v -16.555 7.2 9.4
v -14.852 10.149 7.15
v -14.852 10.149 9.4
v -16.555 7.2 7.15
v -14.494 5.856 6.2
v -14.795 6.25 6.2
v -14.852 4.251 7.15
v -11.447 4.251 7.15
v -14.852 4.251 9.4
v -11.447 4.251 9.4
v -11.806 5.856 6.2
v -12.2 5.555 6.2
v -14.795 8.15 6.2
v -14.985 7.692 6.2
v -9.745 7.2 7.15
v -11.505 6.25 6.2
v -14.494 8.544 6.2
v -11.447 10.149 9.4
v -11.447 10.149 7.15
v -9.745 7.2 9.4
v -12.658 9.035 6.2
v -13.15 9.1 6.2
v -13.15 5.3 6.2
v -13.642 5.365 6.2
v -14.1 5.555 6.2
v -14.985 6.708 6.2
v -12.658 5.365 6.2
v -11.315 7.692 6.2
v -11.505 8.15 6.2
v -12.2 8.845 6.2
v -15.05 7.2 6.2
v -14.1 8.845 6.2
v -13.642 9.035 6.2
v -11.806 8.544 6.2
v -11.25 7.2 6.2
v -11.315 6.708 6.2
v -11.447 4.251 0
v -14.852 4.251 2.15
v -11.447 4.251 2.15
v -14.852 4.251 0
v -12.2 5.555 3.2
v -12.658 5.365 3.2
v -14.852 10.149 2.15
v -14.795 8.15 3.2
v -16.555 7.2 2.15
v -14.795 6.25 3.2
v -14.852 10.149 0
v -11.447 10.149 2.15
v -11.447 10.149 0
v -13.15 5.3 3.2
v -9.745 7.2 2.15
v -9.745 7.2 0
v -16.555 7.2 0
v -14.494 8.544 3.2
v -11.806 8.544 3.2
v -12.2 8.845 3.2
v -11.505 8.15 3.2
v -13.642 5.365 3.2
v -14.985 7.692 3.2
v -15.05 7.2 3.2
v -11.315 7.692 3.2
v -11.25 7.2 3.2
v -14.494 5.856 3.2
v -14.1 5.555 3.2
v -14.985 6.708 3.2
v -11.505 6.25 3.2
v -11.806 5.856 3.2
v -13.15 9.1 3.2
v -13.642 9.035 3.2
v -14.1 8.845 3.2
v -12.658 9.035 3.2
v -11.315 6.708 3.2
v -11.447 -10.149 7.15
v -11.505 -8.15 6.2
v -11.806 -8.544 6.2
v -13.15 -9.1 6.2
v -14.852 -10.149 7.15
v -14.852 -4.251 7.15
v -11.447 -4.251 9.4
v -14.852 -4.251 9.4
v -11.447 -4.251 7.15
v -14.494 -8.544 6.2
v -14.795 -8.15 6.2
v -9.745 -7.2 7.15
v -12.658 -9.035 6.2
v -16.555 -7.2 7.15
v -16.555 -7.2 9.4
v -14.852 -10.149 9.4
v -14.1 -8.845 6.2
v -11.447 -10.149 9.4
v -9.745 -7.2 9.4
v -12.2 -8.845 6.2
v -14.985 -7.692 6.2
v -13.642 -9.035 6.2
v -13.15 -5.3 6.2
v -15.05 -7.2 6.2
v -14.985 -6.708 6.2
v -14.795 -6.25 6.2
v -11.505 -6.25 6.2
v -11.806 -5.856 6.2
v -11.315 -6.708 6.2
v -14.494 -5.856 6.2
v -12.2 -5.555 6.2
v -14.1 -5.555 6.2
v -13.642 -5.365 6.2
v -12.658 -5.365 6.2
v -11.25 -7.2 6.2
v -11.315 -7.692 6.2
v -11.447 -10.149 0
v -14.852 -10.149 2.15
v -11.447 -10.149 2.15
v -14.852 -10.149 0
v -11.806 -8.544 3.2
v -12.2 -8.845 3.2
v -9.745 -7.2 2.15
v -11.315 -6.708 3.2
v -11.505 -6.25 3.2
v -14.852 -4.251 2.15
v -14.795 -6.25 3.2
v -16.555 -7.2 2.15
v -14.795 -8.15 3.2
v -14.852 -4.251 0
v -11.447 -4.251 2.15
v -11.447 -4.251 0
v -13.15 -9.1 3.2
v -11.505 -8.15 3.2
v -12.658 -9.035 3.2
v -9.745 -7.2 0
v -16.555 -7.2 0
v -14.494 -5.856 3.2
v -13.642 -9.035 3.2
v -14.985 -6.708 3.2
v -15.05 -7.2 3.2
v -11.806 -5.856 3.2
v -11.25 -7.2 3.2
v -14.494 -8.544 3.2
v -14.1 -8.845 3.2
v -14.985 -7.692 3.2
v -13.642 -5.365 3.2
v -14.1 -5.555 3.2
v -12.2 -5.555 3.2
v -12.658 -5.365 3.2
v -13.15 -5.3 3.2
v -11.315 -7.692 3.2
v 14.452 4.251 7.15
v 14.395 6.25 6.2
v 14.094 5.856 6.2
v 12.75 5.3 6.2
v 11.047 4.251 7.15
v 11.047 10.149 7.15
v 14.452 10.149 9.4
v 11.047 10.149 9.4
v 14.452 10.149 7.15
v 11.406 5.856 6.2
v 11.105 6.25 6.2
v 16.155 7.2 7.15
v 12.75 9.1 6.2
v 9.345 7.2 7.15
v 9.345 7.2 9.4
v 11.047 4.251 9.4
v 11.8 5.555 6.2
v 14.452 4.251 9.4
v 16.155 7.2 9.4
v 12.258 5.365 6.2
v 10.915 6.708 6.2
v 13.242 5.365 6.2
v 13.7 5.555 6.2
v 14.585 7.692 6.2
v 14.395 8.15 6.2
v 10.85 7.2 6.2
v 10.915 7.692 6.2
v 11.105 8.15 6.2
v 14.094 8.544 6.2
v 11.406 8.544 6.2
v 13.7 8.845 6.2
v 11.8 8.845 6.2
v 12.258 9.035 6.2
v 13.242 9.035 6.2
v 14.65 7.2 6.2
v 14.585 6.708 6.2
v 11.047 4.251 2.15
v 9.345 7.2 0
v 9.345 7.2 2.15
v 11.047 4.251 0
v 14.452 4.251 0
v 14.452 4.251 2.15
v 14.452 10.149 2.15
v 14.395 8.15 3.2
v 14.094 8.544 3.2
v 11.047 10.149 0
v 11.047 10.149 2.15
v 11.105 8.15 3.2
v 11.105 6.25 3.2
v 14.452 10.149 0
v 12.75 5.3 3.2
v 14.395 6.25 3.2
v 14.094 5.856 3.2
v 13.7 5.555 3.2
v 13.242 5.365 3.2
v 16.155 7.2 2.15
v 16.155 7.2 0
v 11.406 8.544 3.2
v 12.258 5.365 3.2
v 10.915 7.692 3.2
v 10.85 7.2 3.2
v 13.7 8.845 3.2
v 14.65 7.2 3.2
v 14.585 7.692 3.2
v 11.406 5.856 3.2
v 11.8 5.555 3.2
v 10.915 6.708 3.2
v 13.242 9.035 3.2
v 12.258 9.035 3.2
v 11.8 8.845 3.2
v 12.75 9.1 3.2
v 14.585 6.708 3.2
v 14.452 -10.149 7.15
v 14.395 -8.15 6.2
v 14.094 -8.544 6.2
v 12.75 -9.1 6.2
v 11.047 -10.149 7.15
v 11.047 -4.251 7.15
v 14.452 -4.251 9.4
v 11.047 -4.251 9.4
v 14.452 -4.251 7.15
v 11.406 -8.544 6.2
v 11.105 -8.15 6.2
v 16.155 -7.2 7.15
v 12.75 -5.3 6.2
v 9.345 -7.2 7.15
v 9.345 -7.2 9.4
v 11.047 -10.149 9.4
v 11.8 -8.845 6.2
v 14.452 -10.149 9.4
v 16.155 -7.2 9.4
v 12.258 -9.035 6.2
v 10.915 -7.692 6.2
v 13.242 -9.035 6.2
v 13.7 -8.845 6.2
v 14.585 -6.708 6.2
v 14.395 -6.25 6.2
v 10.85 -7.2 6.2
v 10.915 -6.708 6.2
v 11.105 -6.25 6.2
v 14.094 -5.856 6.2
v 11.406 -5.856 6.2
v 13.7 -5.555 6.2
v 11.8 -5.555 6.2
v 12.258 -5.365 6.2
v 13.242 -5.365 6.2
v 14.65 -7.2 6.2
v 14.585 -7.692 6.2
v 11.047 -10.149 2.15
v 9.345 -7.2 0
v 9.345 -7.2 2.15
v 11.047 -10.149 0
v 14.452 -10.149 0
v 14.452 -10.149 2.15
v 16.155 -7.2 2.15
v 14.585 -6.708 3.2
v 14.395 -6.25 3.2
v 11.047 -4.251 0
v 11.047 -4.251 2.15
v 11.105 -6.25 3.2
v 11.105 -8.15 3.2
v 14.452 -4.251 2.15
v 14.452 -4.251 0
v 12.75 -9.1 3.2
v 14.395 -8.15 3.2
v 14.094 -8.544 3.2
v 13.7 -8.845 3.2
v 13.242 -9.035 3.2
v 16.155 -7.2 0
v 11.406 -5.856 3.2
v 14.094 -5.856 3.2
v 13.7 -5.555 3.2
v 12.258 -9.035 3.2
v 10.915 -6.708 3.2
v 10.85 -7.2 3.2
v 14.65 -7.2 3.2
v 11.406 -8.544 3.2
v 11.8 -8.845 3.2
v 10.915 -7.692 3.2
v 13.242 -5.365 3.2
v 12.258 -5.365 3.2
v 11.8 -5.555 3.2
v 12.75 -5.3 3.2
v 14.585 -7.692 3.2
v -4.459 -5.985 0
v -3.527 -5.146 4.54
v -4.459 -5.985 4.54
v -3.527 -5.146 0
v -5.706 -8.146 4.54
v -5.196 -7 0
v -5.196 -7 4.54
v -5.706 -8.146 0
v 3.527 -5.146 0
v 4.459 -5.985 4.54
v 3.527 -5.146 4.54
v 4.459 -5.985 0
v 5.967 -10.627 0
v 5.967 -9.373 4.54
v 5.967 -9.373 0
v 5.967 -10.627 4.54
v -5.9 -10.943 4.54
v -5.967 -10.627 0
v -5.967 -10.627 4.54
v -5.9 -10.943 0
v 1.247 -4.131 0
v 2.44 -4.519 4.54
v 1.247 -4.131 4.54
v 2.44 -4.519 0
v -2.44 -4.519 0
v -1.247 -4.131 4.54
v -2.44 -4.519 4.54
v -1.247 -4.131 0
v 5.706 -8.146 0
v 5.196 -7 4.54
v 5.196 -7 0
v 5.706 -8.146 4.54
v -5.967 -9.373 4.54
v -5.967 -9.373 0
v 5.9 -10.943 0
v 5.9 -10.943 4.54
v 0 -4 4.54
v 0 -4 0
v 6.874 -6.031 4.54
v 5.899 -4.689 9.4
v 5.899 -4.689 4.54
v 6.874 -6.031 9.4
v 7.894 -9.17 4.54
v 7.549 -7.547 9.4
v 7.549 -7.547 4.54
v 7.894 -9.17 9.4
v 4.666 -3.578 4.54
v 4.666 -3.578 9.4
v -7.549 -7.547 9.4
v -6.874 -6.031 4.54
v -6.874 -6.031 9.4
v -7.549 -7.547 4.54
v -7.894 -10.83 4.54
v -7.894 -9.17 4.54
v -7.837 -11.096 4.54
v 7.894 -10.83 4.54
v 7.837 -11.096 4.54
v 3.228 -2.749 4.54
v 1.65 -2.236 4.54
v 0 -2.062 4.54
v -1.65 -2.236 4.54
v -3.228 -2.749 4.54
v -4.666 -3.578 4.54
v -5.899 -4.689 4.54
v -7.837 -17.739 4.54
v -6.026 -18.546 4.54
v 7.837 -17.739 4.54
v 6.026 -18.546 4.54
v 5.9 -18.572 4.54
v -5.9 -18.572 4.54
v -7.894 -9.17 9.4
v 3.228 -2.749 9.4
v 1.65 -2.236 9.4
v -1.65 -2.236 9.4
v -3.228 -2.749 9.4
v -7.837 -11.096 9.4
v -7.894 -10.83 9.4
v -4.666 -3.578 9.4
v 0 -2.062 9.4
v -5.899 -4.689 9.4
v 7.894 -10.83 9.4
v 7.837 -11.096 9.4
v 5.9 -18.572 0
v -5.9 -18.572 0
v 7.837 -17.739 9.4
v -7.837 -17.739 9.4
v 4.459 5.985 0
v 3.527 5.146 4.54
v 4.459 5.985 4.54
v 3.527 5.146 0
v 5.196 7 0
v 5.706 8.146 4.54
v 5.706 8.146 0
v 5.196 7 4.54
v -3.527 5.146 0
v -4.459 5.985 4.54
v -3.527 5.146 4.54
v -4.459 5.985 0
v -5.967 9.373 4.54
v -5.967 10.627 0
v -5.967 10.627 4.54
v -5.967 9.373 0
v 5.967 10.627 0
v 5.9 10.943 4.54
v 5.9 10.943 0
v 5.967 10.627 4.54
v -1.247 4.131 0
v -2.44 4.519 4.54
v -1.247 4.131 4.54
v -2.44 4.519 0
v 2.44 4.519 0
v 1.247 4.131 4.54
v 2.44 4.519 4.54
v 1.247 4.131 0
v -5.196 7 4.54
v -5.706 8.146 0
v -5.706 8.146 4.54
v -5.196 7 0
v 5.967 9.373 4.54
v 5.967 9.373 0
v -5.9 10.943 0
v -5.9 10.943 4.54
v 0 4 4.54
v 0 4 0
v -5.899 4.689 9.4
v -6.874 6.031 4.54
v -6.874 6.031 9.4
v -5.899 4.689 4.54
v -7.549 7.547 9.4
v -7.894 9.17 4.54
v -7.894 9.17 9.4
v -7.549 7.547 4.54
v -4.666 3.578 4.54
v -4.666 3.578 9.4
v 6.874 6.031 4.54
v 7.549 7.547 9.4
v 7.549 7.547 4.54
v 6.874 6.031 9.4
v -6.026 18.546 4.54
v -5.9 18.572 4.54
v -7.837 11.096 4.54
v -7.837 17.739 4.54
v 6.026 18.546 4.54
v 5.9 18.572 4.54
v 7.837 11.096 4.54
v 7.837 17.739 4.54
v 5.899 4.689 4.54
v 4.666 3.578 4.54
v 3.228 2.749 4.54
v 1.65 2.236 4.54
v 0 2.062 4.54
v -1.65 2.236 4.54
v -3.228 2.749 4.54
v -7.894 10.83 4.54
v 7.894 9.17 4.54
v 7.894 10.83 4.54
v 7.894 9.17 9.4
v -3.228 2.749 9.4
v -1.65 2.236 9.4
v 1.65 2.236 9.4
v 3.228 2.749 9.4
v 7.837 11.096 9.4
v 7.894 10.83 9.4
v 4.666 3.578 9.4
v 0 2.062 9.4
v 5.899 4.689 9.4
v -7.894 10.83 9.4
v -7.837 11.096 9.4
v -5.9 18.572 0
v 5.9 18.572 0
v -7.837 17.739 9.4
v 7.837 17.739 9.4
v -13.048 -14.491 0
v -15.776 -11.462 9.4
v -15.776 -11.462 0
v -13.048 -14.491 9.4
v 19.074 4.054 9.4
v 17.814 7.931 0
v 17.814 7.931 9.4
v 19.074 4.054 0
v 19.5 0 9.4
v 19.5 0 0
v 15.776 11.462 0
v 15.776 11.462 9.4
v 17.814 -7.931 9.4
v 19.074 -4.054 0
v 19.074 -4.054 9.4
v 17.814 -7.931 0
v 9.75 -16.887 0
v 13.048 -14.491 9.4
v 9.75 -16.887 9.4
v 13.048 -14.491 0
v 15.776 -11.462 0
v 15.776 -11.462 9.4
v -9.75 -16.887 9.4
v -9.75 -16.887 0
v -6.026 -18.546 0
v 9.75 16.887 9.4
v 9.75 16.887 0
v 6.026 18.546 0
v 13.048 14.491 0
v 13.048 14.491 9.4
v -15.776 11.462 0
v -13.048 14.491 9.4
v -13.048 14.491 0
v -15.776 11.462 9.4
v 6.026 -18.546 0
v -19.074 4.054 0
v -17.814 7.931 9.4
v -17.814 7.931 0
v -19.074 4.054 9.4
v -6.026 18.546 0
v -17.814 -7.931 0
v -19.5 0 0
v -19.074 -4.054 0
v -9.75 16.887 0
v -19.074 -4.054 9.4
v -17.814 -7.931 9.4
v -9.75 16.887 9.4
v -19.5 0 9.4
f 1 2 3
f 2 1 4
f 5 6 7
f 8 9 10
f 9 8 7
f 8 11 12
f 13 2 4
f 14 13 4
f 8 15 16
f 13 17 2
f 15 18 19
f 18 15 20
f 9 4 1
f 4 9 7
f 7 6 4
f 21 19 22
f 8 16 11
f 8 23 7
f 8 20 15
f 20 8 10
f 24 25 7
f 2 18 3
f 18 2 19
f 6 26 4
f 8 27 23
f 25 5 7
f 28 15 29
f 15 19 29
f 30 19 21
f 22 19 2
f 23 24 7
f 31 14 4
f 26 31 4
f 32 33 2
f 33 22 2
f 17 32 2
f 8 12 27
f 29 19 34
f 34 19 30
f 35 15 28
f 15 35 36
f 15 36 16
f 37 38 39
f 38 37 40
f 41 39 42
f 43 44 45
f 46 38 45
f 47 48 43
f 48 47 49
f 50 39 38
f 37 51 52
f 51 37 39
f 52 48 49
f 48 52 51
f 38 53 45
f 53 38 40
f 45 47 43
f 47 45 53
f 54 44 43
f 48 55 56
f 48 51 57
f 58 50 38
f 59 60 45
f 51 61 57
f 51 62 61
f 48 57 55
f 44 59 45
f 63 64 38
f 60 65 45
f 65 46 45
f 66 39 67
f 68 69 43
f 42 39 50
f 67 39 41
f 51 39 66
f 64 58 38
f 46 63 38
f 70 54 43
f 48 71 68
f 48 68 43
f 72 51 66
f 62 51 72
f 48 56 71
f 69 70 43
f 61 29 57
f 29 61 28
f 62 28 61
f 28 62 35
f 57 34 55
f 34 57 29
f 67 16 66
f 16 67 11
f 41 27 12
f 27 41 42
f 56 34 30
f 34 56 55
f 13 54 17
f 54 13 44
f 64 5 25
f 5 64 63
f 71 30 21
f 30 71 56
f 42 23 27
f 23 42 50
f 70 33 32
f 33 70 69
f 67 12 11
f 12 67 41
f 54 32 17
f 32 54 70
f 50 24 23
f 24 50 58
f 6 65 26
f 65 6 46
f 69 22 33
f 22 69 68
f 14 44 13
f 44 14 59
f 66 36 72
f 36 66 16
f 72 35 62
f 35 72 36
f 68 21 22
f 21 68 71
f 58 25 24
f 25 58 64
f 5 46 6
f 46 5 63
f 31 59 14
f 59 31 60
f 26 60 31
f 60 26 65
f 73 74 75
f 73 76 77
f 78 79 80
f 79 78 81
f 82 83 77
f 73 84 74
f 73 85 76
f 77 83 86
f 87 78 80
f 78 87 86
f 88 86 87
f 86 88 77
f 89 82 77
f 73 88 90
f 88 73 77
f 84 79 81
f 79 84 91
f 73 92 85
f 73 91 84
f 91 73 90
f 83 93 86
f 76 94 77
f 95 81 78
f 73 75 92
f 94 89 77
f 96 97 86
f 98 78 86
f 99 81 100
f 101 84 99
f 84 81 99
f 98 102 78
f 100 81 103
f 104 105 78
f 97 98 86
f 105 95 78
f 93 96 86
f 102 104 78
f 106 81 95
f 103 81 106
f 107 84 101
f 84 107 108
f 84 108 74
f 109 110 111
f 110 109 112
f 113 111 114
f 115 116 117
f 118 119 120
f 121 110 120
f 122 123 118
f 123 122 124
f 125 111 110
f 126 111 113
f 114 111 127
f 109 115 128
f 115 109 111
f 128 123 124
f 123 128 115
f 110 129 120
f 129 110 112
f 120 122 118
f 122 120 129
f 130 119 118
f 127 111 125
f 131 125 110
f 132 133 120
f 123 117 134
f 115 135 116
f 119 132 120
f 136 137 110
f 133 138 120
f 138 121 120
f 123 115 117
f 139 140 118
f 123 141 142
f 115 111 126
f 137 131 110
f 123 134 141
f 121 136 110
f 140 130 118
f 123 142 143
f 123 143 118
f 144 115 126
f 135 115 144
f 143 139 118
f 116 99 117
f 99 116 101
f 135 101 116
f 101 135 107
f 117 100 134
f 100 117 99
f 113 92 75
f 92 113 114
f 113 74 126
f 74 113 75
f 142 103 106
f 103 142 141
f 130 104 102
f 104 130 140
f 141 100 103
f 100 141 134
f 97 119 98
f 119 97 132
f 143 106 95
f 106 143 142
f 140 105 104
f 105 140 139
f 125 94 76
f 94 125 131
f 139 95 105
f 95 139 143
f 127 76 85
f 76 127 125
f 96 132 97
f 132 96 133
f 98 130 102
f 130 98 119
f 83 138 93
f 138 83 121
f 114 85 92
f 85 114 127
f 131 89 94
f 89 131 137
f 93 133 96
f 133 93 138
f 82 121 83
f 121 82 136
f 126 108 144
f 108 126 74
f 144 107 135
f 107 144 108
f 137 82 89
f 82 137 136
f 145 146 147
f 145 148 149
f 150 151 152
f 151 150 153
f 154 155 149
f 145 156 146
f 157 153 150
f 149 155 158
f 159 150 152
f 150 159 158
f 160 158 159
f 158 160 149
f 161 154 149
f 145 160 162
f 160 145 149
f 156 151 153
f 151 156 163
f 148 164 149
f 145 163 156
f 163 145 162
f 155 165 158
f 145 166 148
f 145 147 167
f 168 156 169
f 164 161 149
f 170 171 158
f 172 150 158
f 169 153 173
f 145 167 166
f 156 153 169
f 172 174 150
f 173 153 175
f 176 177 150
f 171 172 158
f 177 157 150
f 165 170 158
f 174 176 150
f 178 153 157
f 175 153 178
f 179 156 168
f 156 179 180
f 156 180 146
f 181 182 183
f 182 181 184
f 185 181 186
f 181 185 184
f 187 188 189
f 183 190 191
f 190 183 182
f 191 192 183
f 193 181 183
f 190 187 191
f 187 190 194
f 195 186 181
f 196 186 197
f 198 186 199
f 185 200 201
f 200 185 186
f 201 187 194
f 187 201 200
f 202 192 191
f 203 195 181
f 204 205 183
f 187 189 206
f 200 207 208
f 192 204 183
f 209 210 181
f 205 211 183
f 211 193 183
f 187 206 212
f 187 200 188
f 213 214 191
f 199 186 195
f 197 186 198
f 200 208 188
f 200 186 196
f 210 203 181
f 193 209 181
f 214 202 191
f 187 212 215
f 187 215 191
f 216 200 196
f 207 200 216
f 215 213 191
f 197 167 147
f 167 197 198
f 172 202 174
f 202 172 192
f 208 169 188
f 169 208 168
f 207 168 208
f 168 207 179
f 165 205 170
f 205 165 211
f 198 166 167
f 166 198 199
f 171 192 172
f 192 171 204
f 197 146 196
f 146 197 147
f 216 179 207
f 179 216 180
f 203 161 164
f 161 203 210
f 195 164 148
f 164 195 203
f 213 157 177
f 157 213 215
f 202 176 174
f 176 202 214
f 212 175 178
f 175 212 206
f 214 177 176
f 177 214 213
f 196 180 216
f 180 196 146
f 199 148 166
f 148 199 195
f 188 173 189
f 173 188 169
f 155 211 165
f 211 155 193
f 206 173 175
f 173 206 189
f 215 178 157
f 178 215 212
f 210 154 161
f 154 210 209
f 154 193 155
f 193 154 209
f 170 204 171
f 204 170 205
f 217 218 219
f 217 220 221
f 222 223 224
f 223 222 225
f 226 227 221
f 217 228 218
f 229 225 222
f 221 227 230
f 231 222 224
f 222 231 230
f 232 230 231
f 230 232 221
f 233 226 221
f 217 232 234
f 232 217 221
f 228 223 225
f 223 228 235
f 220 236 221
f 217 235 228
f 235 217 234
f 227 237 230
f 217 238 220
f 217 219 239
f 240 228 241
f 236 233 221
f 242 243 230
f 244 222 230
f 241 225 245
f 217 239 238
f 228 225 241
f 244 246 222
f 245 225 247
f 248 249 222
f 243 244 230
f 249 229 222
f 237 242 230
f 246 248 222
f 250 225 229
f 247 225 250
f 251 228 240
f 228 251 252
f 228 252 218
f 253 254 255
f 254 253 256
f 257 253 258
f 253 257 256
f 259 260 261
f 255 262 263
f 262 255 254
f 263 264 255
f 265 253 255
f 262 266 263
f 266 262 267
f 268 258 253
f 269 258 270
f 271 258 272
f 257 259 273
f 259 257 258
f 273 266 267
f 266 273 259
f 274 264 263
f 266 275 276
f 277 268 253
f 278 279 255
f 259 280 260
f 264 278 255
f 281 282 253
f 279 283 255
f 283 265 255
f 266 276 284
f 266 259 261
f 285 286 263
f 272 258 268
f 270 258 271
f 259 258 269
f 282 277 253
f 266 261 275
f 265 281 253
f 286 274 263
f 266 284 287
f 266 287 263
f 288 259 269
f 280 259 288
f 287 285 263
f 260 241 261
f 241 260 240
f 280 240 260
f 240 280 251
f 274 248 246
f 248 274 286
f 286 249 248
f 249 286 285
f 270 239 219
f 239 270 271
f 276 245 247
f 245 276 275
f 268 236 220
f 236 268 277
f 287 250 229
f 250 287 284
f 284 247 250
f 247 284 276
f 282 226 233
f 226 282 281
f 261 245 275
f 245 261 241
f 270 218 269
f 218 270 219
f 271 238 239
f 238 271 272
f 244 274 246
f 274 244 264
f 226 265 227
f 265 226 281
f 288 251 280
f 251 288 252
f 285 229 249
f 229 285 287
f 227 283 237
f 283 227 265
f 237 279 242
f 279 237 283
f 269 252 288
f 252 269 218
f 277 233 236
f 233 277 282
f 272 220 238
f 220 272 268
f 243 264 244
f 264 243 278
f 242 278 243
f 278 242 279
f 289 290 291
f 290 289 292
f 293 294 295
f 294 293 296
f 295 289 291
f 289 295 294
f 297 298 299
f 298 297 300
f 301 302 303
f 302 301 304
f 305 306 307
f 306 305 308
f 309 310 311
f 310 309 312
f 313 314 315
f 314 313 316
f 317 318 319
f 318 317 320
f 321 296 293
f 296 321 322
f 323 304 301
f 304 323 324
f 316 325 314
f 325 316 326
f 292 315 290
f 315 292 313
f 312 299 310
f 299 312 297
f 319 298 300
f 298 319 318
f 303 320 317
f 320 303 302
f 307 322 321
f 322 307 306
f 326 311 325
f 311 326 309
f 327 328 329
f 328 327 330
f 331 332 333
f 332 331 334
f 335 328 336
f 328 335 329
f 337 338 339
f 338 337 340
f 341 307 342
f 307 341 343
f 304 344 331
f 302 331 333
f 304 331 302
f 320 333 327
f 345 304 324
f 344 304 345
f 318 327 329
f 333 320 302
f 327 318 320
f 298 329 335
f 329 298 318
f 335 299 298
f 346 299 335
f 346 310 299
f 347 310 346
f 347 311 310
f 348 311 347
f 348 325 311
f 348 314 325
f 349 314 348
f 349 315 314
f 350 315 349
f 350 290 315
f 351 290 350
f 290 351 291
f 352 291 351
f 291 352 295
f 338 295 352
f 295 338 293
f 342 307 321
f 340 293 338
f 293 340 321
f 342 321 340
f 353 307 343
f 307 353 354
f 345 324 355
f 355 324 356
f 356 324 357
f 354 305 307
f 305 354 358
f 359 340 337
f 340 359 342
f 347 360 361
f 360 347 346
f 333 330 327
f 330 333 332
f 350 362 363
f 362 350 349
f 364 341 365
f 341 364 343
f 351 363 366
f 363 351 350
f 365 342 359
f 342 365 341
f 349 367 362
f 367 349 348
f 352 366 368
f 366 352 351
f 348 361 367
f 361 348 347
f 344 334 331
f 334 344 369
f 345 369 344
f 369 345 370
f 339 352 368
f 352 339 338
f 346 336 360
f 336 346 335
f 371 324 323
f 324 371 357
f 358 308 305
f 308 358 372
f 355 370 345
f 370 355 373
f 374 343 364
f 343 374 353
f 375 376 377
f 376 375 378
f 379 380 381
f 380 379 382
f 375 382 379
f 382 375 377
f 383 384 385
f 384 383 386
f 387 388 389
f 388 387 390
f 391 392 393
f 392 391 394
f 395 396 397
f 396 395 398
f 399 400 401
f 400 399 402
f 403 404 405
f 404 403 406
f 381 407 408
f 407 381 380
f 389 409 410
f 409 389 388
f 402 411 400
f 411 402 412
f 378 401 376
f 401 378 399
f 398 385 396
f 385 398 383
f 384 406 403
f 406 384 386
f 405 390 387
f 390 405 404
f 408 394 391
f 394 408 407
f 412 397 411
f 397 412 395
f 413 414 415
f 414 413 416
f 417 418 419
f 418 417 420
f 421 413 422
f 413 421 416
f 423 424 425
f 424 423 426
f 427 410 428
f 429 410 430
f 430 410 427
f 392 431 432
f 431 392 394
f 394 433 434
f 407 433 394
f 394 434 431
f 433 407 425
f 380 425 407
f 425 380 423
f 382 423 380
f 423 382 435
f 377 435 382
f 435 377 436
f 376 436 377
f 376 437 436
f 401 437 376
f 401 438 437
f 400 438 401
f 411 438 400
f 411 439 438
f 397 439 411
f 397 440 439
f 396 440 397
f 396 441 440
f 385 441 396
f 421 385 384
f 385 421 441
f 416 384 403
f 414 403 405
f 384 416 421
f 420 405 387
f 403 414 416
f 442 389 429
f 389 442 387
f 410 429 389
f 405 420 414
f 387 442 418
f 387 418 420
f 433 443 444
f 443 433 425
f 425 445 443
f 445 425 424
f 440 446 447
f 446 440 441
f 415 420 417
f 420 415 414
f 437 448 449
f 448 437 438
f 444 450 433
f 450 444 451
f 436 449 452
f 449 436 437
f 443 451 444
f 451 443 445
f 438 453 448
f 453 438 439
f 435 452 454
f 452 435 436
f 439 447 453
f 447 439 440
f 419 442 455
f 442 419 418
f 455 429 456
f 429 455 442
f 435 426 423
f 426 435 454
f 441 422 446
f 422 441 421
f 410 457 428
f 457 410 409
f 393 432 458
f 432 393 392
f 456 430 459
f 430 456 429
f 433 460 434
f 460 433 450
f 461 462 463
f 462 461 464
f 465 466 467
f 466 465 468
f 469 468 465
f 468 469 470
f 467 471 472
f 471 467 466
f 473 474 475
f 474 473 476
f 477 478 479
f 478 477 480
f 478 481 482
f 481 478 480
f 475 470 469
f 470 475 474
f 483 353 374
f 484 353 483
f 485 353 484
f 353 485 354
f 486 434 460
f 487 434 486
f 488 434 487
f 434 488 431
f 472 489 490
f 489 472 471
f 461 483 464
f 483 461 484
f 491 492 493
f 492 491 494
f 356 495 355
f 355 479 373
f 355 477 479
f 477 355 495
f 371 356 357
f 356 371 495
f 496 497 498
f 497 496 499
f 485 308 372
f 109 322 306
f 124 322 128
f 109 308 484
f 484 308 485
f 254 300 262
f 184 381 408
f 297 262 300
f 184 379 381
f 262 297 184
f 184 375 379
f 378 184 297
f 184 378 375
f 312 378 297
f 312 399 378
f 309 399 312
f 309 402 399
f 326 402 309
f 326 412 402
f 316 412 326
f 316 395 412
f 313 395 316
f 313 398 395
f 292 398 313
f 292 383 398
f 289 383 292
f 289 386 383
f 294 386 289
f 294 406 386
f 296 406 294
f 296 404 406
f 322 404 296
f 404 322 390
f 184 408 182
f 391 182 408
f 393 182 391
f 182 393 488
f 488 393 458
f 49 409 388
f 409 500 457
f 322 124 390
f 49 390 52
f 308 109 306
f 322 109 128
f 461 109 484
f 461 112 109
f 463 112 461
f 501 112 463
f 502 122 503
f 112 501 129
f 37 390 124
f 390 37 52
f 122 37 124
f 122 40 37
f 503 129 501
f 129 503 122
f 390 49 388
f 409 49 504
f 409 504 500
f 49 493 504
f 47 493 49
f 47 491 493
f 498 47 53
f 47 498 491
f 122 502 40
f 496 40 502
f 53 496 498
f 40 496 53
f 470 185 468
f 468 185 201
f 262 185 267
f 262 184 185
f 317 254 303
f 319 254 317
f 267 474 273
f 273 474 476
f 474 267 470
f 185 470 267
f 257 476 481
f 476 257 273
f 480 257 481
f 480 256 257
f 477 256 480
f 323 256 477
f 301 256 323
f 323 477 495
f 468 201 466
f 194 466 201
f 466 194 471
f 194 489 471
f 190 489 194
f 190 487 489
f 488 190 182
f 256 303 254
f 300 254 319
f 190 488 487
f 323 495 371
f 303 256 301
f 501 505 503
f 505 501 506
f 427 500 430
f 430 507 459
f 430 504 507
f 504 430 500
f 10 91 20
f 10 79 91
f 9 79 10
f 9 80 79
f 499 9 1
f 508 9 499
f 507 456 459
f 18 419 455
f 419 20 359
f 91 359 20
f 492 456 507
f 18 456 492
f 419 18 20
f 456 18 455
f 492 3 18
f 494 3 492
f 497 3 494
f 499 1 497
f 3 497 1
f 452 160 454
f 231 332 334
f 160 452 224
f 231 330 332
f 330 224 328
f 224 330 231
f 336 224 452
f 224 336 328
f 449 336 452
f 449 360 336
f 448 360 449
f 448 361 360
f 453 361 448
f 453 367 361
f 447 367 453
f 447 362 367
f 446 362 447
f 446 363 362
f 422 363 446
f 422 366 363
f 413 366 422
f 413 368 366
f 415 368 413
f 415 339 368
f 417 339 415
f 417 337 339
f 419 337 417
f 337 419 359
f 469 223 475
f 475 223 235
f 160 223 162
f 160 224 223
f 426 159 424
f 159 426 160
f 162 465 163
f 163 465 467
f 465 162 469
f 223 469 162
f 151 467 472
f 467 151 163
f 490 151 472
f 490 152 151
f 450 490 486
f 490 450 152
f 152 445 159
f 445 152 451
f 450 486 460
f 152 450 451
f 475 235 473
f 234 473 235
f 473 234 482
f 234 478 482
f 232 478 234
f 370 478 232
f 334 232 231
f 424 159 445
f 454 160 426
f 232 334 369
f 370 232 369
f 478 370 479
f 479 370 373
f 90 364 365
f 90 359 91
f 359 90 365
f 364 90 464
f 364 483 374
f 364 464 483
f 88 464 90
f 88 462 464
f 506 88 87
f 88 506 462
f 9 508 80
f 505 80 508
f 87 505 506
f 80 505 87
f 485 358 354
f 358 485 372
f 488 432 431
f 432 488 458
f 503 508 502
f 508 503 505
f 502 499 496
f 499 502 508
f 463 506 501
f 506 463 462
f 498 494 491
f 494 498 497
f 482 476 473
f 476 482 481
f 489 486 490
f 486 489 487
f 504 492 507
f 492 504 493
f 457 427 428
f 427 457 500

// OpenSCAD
$fs=0.5*1;
j_head_dia = 15.875*1;
j_head_upper_h = 4.76*1;
j_head_groove_dia = 12*1;
j_head_groove_h = 4.64*1;
insert_height=j_head_groove_h+j_head_upper_h;
dual_offset = 10*1;
extra = 0.1*1;
ns=1*1;

M3_clearance_radius = (3/2)+0.4;//(3.3/2);
M3_nut_radius = (6.01/2)+0.4;
M3_nut_trap_depth = 2.2*1;
M4_clearance_radius = (4/2)+0.4;//2.2;
holes = [
	[-13.15,7.2],
	[-13.15,-7.2],
	[12.75,7.2],
	[12.75,-7.2]
];

// Customizer Settings

// The configuration of the heads. Can be single or double.
Insert_Configuration = "Double"; //[Single,Double]

// The configuration of the plate. "All" will result in a plate that can be used with either the single or double insert. "Single" and "Double" will result in a plate specific to the insert.
Plate_Configuration = "All"; //[All,Single,Double]

// The tap drill diameter of the pneumatic fitting threads. Some common values: 1/8" NPT = 8.611 mm, 1/4" NPT = 11.113 mm, 1/8" BSP = 8.6, 1/4" BSP = 11.5.
Pneumatic_Fitting_Thread_Diameter = 8.6;

// The length of the threaded part of the pneumatic fitting.
Pneumatic_Fitting_Thread_Height = 7.0;

fitting_wall_th = 2*1; 
plate_chamfer = 1*1;

// The thickness of the plate.
Plate_Height = 3;

// The diameter of the plate. This should match the outer diameter of the Rostock platform; for the standard Rostock this should be 60.
Plate_Diameter = 60;

// The diameter of the insert. This should be just less than the inner diameter of the Rostock platform; for the standard Rostock the inner diameter is 40.
Insert_Diameter = 39;

// The bolt circle diameter for the 4 mm bolts ono the plate. This should match the bolt circle diameter of the Rostock Platform; for the standard Rostock this should be 50.
Plate_Bolt_Circle_Diameter = 50;

// What objects would you like to generate?
Resulting_Objects = "Insert";//[Both,Plate,Insert]



max_height=max(Plate_Height,Pneumatic_Fitting_Thread_Height,insert_height);

// Display
if(Resulting_Objects=="Both") {
translate([(Plate_Diameter/2)+2.5,0,0])	jhead_mount_plate();
translate([-(Insert_Diameter/2)-2.5,0,0]) jhead_mount_insert();
} else if(Resulting_Objects=="Plate") {
	jhead_mount_plate();
} else if(Resulting_Objects=="Insert") {
	jhead_mount_insert();
} else {
	echo("This shouldn't happen.");
}

module jhead_mount_plate() {
  difference() {
		// Base plate.
		union() {
		hull() {
			cylinder(r=(Plate_Diameter/2),h=Plate_Height-plate_chamfer);
			translate([0,0,Plate_Height-plate_chamfer]) cylinder(r=(Plate_Diameter/2)-plate_chamfer,h=plate_chamfer);
		}
	hull() {
		if(Plate_Configuration!="Double") {
		translate([0,0,0]) cylinder(r=(Pneumatic_Fitting_Thread_Diameter/2)+fitting_wall_th,h=Pneumatic_Fitting_Thread_Height);
		}
	if(Plate_Configuration!="Single") {
		translate([0,-dual_offset,0]) cylinder(r=(Pneumatic_Fitting_Thread_Diameter/2)+fitting_wall_th,h=Pneumatic_Fitting_Thread_Height);
		translate([0,dual_offset,0]) cylinder(r=(Pneumatic_Fitting_Thread_Diameter/2)+fitting_wall_th,h=Pneumatic_Fitting_Thread_Height);
		}
	}	
}

		// 6 x 4mm holes for mounting to platform.
		for(i=[0:60:360]) {
			rotate([0,0,i]) translate([(Plate_Bolt_Circle_Diameter/2),0,-extra]) cylinder(r=M4_clearance_radius,h=max_height+(2*extra));
		}

		// 3 x 5mm holes for pneumatic fitting(s).
		if(Plate_Configuration!="Double") {
		translate([0,0,-extra]) cylinder(r=(Pneumatic_Fitting_Thread_Diameter/2),h=max_height+(2*extra));
}
	if(Plate_Configuration!="Single") {
		translate([0,-dual_offset,-extra]) cylinder(r=(Pneumatic_Fitting_Thread_Diameter/2),h=max_height+(2*extra));
		translate([0,dual_offset,-extra]) cylinder(r=(Pneumatic_Fitting_Thread_Diameter/2),h=max_height+(2*extra));
}

		// 3mm holes for mounting J_insert.
		for (i=holes) {
			translate([i[0],i[1],-extra]) cylinder(h=max_height+(2*extra),r=M3_clearance_radius,center=true);
		}
  }

}

module jhead_mount_insert() {
	difference() {
		// Base insert.
		cylinder(h=insert_height,r=(Insert_Diameter/2));

		// 3mm holes for mounting to J_Ring.
		for (i=holes) {
			// 3mm hole through insert.
			

			// M3 nut on top of insert.
			hull() {
				translate([i[0],i[1],insert_height-M3_nut_trap_depth-(ns/2)]) cylinder(h=ns,r=M3_clearance_radius,center=true);
				translate([i[0],i[1],insert_height-(M3_nut_trap_depth/2)]) cylinder(h=M3_nut_trap_depth+extra,r=M3_nut_radius,center=true,$fn=6);
			}

			// M3 nut of bottom of insert.
			hull() {
				translate([i[0],i[1],M3_nut_trap_depth+(ns/2)]) cylinder(h=ns,r=M3_clearance_radius,center=true);
				translate([i[0],i[1],(M3_nut_trap_depth/2)-extra]) cylinder(h=M3_nut_trap_depth+extra,r=M3_nut_radius,center=true,$fn=6);
			}
			translate([i[0],i[1],-extra]) cylinder(h=max_height+(2*extra),r=M3_clearance_radius);
		}

		// Hole for J-Head.
		if(Insert_Configuration=="Double") {
			translate([0,-dual_offset,-0.1]) rotate([0,0,270]) jhead_hole();
			translate([0,dual_offset,-0.1]) rotate([0,0,90]) jhead_hole();
		} else {
			translate([0,0,-0.1]) rotate([0,0,270]) jhead_hole();
		}
	}
}

module jhead_hole() {
	translate([0,0,-extra]) cylinder(h=max_height+(2*extra),r=j_head_groove_dia/2,center=true);
	translate([0,0,j_head_groove_h]) cylinder(h=5,r=j_head_dia/2);
	translate([(Insert_Diameter/2)/2,0,-extra]) cube([(Insert_Diameter/2),j_head_groove_dia-0.2,max_height+(2*extra)],center=true);
	translate([(Insert_Diameter/2)/2,0,(5/2)+j_head_groove_h]) cube([(Insert_Diameter/2),j_head_dia-0.2,5],center=true);
}
